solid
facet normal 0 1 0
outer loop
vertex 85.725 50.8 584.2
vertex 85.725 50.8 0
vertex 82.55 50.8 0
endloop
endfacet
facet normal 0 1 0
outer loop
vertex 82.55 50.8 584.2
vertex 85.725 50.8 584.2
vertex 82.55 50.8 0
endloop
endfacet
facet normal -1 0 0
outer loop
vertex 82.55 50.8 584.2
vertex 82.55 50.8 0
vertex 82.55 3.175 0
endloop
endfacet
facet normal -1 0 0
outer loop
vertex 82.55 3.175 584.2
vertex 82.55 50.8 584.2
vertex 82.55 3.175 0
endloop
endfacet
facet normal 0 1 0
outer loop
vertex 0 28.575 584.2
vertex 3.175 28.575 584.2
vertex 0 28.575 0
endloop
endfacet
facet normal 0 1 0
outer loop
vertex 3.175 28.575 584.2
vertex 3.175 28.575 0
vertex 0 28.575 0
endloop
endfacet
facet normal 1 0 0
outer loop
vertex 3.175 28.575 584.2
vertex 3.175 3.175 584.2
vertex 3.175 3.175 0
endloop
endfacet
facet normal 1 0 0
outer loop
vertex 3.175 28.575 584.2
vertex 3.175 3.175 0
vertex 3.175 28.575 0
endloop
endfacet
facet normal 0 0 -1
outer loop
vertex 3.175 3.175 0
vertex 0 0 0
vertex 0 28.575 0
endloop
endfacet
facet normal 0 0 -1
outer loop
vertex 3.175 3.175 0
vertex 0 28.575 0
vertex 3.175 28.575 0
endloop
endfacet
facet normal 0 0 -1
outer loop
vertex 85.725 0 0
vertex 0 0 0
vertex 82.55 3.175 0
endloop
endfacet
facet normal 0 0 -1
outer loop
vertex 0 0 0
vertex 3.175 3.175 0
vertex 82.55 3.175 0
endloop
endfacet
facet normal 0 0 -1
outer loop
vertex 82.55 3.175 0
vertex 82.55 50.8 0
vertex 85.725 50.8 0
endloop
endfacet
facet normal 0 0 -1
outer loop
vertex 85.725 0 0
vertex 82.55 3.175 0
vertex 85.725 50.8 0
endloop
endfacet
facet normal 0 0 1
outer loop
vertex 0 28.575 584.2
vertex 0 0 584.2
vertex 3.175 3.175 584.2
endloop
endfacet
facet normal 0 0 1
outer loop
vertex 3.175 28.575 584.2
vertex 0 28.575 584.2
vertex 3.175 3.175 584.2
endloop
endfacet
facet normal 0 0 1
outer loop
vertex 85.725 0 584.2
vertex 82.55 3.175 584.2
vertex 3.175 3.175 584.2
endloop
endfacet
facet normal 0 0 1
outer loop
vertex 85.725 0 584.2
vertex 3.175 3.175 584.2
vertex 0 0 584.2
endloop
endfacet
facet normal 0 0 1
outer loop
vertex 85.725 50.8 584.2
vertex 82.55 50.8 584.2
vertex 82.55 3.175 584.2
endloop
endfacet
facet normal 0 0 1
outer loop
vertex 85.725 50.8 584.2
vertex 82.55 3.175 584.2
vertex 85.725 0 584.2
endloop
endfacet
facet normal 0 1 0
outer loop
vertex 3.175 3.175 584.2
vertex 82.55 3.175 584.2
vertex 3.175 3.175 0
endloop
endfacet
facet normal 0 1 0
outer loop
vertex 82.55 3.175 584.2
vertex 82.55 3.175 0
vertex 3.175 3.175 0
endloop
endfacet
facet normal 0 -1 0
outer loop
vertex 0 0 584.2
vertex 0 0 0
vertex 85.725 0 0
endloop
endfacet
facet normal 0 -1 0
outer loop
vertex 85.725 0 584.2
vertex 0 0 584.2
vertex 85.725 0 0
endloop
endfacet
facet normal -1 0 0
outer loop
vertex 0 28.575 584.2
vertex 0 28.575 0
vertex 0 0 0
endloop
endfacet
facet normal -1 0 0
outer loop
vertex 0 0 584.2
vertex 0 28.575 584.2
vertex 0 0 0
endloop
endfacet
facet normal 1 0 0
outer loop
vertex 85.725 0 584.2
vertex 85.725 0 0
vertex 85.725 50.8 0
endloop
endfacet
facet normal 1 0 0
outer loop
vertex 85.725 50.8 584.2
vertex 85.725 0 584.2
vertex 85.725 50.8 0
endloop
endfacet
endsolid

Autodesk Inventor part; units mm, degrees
ref_plane "YZ Plane" through (0, 0, 0) normal (1, 0, 0) x (0, 1, 0)
ref_plane "XZ Plane" through (0, 0, 0) normal (0, 1, 0) x (-1, 0, 0)
ref_plane "XY Plane" through (0, 0, 0) normal (0, 0, 1) x (1, 0, 0)
sketch "Sketch1" plane through (0, 0, 0) normal (0, 0, 1) x (1, 0, 0)
  line L0 (0, 0) -> (85.725, 0)
  line L1 (0, 0) -> (85.725, 0) construction
  line L2 (85.725, 0) -> (85.725, 50.8)
  line L3 (85.725, 50.8) -> (82.55, 50.8)
  line L4 (82.55, 50.8) -> (82.55, 3.175)
  line L5 (82.55, 3.175) -> (3.175, 3.175)
  line L6 (3.175, 3.175) -> (3.175, 28.575)
  line L7 (3.175, 28.575) -> (0, 28.575)
  line L8 (0, 28.575) -> (0, 0)
  dimension "d0" = 85.725
  dimension "d1" = 0
  dimension "d2" = 50.8
  dimension "d3" = 90
  dimension "d4" = 3.175
  dimension "d5" = 47.625
  dimension "d6" = 79.375
  dimension "d7" = 25.4
extrude "Extrusion1" add sketch "Sketch1" along normal blind 584.2
properties part number "FrameFandB"
